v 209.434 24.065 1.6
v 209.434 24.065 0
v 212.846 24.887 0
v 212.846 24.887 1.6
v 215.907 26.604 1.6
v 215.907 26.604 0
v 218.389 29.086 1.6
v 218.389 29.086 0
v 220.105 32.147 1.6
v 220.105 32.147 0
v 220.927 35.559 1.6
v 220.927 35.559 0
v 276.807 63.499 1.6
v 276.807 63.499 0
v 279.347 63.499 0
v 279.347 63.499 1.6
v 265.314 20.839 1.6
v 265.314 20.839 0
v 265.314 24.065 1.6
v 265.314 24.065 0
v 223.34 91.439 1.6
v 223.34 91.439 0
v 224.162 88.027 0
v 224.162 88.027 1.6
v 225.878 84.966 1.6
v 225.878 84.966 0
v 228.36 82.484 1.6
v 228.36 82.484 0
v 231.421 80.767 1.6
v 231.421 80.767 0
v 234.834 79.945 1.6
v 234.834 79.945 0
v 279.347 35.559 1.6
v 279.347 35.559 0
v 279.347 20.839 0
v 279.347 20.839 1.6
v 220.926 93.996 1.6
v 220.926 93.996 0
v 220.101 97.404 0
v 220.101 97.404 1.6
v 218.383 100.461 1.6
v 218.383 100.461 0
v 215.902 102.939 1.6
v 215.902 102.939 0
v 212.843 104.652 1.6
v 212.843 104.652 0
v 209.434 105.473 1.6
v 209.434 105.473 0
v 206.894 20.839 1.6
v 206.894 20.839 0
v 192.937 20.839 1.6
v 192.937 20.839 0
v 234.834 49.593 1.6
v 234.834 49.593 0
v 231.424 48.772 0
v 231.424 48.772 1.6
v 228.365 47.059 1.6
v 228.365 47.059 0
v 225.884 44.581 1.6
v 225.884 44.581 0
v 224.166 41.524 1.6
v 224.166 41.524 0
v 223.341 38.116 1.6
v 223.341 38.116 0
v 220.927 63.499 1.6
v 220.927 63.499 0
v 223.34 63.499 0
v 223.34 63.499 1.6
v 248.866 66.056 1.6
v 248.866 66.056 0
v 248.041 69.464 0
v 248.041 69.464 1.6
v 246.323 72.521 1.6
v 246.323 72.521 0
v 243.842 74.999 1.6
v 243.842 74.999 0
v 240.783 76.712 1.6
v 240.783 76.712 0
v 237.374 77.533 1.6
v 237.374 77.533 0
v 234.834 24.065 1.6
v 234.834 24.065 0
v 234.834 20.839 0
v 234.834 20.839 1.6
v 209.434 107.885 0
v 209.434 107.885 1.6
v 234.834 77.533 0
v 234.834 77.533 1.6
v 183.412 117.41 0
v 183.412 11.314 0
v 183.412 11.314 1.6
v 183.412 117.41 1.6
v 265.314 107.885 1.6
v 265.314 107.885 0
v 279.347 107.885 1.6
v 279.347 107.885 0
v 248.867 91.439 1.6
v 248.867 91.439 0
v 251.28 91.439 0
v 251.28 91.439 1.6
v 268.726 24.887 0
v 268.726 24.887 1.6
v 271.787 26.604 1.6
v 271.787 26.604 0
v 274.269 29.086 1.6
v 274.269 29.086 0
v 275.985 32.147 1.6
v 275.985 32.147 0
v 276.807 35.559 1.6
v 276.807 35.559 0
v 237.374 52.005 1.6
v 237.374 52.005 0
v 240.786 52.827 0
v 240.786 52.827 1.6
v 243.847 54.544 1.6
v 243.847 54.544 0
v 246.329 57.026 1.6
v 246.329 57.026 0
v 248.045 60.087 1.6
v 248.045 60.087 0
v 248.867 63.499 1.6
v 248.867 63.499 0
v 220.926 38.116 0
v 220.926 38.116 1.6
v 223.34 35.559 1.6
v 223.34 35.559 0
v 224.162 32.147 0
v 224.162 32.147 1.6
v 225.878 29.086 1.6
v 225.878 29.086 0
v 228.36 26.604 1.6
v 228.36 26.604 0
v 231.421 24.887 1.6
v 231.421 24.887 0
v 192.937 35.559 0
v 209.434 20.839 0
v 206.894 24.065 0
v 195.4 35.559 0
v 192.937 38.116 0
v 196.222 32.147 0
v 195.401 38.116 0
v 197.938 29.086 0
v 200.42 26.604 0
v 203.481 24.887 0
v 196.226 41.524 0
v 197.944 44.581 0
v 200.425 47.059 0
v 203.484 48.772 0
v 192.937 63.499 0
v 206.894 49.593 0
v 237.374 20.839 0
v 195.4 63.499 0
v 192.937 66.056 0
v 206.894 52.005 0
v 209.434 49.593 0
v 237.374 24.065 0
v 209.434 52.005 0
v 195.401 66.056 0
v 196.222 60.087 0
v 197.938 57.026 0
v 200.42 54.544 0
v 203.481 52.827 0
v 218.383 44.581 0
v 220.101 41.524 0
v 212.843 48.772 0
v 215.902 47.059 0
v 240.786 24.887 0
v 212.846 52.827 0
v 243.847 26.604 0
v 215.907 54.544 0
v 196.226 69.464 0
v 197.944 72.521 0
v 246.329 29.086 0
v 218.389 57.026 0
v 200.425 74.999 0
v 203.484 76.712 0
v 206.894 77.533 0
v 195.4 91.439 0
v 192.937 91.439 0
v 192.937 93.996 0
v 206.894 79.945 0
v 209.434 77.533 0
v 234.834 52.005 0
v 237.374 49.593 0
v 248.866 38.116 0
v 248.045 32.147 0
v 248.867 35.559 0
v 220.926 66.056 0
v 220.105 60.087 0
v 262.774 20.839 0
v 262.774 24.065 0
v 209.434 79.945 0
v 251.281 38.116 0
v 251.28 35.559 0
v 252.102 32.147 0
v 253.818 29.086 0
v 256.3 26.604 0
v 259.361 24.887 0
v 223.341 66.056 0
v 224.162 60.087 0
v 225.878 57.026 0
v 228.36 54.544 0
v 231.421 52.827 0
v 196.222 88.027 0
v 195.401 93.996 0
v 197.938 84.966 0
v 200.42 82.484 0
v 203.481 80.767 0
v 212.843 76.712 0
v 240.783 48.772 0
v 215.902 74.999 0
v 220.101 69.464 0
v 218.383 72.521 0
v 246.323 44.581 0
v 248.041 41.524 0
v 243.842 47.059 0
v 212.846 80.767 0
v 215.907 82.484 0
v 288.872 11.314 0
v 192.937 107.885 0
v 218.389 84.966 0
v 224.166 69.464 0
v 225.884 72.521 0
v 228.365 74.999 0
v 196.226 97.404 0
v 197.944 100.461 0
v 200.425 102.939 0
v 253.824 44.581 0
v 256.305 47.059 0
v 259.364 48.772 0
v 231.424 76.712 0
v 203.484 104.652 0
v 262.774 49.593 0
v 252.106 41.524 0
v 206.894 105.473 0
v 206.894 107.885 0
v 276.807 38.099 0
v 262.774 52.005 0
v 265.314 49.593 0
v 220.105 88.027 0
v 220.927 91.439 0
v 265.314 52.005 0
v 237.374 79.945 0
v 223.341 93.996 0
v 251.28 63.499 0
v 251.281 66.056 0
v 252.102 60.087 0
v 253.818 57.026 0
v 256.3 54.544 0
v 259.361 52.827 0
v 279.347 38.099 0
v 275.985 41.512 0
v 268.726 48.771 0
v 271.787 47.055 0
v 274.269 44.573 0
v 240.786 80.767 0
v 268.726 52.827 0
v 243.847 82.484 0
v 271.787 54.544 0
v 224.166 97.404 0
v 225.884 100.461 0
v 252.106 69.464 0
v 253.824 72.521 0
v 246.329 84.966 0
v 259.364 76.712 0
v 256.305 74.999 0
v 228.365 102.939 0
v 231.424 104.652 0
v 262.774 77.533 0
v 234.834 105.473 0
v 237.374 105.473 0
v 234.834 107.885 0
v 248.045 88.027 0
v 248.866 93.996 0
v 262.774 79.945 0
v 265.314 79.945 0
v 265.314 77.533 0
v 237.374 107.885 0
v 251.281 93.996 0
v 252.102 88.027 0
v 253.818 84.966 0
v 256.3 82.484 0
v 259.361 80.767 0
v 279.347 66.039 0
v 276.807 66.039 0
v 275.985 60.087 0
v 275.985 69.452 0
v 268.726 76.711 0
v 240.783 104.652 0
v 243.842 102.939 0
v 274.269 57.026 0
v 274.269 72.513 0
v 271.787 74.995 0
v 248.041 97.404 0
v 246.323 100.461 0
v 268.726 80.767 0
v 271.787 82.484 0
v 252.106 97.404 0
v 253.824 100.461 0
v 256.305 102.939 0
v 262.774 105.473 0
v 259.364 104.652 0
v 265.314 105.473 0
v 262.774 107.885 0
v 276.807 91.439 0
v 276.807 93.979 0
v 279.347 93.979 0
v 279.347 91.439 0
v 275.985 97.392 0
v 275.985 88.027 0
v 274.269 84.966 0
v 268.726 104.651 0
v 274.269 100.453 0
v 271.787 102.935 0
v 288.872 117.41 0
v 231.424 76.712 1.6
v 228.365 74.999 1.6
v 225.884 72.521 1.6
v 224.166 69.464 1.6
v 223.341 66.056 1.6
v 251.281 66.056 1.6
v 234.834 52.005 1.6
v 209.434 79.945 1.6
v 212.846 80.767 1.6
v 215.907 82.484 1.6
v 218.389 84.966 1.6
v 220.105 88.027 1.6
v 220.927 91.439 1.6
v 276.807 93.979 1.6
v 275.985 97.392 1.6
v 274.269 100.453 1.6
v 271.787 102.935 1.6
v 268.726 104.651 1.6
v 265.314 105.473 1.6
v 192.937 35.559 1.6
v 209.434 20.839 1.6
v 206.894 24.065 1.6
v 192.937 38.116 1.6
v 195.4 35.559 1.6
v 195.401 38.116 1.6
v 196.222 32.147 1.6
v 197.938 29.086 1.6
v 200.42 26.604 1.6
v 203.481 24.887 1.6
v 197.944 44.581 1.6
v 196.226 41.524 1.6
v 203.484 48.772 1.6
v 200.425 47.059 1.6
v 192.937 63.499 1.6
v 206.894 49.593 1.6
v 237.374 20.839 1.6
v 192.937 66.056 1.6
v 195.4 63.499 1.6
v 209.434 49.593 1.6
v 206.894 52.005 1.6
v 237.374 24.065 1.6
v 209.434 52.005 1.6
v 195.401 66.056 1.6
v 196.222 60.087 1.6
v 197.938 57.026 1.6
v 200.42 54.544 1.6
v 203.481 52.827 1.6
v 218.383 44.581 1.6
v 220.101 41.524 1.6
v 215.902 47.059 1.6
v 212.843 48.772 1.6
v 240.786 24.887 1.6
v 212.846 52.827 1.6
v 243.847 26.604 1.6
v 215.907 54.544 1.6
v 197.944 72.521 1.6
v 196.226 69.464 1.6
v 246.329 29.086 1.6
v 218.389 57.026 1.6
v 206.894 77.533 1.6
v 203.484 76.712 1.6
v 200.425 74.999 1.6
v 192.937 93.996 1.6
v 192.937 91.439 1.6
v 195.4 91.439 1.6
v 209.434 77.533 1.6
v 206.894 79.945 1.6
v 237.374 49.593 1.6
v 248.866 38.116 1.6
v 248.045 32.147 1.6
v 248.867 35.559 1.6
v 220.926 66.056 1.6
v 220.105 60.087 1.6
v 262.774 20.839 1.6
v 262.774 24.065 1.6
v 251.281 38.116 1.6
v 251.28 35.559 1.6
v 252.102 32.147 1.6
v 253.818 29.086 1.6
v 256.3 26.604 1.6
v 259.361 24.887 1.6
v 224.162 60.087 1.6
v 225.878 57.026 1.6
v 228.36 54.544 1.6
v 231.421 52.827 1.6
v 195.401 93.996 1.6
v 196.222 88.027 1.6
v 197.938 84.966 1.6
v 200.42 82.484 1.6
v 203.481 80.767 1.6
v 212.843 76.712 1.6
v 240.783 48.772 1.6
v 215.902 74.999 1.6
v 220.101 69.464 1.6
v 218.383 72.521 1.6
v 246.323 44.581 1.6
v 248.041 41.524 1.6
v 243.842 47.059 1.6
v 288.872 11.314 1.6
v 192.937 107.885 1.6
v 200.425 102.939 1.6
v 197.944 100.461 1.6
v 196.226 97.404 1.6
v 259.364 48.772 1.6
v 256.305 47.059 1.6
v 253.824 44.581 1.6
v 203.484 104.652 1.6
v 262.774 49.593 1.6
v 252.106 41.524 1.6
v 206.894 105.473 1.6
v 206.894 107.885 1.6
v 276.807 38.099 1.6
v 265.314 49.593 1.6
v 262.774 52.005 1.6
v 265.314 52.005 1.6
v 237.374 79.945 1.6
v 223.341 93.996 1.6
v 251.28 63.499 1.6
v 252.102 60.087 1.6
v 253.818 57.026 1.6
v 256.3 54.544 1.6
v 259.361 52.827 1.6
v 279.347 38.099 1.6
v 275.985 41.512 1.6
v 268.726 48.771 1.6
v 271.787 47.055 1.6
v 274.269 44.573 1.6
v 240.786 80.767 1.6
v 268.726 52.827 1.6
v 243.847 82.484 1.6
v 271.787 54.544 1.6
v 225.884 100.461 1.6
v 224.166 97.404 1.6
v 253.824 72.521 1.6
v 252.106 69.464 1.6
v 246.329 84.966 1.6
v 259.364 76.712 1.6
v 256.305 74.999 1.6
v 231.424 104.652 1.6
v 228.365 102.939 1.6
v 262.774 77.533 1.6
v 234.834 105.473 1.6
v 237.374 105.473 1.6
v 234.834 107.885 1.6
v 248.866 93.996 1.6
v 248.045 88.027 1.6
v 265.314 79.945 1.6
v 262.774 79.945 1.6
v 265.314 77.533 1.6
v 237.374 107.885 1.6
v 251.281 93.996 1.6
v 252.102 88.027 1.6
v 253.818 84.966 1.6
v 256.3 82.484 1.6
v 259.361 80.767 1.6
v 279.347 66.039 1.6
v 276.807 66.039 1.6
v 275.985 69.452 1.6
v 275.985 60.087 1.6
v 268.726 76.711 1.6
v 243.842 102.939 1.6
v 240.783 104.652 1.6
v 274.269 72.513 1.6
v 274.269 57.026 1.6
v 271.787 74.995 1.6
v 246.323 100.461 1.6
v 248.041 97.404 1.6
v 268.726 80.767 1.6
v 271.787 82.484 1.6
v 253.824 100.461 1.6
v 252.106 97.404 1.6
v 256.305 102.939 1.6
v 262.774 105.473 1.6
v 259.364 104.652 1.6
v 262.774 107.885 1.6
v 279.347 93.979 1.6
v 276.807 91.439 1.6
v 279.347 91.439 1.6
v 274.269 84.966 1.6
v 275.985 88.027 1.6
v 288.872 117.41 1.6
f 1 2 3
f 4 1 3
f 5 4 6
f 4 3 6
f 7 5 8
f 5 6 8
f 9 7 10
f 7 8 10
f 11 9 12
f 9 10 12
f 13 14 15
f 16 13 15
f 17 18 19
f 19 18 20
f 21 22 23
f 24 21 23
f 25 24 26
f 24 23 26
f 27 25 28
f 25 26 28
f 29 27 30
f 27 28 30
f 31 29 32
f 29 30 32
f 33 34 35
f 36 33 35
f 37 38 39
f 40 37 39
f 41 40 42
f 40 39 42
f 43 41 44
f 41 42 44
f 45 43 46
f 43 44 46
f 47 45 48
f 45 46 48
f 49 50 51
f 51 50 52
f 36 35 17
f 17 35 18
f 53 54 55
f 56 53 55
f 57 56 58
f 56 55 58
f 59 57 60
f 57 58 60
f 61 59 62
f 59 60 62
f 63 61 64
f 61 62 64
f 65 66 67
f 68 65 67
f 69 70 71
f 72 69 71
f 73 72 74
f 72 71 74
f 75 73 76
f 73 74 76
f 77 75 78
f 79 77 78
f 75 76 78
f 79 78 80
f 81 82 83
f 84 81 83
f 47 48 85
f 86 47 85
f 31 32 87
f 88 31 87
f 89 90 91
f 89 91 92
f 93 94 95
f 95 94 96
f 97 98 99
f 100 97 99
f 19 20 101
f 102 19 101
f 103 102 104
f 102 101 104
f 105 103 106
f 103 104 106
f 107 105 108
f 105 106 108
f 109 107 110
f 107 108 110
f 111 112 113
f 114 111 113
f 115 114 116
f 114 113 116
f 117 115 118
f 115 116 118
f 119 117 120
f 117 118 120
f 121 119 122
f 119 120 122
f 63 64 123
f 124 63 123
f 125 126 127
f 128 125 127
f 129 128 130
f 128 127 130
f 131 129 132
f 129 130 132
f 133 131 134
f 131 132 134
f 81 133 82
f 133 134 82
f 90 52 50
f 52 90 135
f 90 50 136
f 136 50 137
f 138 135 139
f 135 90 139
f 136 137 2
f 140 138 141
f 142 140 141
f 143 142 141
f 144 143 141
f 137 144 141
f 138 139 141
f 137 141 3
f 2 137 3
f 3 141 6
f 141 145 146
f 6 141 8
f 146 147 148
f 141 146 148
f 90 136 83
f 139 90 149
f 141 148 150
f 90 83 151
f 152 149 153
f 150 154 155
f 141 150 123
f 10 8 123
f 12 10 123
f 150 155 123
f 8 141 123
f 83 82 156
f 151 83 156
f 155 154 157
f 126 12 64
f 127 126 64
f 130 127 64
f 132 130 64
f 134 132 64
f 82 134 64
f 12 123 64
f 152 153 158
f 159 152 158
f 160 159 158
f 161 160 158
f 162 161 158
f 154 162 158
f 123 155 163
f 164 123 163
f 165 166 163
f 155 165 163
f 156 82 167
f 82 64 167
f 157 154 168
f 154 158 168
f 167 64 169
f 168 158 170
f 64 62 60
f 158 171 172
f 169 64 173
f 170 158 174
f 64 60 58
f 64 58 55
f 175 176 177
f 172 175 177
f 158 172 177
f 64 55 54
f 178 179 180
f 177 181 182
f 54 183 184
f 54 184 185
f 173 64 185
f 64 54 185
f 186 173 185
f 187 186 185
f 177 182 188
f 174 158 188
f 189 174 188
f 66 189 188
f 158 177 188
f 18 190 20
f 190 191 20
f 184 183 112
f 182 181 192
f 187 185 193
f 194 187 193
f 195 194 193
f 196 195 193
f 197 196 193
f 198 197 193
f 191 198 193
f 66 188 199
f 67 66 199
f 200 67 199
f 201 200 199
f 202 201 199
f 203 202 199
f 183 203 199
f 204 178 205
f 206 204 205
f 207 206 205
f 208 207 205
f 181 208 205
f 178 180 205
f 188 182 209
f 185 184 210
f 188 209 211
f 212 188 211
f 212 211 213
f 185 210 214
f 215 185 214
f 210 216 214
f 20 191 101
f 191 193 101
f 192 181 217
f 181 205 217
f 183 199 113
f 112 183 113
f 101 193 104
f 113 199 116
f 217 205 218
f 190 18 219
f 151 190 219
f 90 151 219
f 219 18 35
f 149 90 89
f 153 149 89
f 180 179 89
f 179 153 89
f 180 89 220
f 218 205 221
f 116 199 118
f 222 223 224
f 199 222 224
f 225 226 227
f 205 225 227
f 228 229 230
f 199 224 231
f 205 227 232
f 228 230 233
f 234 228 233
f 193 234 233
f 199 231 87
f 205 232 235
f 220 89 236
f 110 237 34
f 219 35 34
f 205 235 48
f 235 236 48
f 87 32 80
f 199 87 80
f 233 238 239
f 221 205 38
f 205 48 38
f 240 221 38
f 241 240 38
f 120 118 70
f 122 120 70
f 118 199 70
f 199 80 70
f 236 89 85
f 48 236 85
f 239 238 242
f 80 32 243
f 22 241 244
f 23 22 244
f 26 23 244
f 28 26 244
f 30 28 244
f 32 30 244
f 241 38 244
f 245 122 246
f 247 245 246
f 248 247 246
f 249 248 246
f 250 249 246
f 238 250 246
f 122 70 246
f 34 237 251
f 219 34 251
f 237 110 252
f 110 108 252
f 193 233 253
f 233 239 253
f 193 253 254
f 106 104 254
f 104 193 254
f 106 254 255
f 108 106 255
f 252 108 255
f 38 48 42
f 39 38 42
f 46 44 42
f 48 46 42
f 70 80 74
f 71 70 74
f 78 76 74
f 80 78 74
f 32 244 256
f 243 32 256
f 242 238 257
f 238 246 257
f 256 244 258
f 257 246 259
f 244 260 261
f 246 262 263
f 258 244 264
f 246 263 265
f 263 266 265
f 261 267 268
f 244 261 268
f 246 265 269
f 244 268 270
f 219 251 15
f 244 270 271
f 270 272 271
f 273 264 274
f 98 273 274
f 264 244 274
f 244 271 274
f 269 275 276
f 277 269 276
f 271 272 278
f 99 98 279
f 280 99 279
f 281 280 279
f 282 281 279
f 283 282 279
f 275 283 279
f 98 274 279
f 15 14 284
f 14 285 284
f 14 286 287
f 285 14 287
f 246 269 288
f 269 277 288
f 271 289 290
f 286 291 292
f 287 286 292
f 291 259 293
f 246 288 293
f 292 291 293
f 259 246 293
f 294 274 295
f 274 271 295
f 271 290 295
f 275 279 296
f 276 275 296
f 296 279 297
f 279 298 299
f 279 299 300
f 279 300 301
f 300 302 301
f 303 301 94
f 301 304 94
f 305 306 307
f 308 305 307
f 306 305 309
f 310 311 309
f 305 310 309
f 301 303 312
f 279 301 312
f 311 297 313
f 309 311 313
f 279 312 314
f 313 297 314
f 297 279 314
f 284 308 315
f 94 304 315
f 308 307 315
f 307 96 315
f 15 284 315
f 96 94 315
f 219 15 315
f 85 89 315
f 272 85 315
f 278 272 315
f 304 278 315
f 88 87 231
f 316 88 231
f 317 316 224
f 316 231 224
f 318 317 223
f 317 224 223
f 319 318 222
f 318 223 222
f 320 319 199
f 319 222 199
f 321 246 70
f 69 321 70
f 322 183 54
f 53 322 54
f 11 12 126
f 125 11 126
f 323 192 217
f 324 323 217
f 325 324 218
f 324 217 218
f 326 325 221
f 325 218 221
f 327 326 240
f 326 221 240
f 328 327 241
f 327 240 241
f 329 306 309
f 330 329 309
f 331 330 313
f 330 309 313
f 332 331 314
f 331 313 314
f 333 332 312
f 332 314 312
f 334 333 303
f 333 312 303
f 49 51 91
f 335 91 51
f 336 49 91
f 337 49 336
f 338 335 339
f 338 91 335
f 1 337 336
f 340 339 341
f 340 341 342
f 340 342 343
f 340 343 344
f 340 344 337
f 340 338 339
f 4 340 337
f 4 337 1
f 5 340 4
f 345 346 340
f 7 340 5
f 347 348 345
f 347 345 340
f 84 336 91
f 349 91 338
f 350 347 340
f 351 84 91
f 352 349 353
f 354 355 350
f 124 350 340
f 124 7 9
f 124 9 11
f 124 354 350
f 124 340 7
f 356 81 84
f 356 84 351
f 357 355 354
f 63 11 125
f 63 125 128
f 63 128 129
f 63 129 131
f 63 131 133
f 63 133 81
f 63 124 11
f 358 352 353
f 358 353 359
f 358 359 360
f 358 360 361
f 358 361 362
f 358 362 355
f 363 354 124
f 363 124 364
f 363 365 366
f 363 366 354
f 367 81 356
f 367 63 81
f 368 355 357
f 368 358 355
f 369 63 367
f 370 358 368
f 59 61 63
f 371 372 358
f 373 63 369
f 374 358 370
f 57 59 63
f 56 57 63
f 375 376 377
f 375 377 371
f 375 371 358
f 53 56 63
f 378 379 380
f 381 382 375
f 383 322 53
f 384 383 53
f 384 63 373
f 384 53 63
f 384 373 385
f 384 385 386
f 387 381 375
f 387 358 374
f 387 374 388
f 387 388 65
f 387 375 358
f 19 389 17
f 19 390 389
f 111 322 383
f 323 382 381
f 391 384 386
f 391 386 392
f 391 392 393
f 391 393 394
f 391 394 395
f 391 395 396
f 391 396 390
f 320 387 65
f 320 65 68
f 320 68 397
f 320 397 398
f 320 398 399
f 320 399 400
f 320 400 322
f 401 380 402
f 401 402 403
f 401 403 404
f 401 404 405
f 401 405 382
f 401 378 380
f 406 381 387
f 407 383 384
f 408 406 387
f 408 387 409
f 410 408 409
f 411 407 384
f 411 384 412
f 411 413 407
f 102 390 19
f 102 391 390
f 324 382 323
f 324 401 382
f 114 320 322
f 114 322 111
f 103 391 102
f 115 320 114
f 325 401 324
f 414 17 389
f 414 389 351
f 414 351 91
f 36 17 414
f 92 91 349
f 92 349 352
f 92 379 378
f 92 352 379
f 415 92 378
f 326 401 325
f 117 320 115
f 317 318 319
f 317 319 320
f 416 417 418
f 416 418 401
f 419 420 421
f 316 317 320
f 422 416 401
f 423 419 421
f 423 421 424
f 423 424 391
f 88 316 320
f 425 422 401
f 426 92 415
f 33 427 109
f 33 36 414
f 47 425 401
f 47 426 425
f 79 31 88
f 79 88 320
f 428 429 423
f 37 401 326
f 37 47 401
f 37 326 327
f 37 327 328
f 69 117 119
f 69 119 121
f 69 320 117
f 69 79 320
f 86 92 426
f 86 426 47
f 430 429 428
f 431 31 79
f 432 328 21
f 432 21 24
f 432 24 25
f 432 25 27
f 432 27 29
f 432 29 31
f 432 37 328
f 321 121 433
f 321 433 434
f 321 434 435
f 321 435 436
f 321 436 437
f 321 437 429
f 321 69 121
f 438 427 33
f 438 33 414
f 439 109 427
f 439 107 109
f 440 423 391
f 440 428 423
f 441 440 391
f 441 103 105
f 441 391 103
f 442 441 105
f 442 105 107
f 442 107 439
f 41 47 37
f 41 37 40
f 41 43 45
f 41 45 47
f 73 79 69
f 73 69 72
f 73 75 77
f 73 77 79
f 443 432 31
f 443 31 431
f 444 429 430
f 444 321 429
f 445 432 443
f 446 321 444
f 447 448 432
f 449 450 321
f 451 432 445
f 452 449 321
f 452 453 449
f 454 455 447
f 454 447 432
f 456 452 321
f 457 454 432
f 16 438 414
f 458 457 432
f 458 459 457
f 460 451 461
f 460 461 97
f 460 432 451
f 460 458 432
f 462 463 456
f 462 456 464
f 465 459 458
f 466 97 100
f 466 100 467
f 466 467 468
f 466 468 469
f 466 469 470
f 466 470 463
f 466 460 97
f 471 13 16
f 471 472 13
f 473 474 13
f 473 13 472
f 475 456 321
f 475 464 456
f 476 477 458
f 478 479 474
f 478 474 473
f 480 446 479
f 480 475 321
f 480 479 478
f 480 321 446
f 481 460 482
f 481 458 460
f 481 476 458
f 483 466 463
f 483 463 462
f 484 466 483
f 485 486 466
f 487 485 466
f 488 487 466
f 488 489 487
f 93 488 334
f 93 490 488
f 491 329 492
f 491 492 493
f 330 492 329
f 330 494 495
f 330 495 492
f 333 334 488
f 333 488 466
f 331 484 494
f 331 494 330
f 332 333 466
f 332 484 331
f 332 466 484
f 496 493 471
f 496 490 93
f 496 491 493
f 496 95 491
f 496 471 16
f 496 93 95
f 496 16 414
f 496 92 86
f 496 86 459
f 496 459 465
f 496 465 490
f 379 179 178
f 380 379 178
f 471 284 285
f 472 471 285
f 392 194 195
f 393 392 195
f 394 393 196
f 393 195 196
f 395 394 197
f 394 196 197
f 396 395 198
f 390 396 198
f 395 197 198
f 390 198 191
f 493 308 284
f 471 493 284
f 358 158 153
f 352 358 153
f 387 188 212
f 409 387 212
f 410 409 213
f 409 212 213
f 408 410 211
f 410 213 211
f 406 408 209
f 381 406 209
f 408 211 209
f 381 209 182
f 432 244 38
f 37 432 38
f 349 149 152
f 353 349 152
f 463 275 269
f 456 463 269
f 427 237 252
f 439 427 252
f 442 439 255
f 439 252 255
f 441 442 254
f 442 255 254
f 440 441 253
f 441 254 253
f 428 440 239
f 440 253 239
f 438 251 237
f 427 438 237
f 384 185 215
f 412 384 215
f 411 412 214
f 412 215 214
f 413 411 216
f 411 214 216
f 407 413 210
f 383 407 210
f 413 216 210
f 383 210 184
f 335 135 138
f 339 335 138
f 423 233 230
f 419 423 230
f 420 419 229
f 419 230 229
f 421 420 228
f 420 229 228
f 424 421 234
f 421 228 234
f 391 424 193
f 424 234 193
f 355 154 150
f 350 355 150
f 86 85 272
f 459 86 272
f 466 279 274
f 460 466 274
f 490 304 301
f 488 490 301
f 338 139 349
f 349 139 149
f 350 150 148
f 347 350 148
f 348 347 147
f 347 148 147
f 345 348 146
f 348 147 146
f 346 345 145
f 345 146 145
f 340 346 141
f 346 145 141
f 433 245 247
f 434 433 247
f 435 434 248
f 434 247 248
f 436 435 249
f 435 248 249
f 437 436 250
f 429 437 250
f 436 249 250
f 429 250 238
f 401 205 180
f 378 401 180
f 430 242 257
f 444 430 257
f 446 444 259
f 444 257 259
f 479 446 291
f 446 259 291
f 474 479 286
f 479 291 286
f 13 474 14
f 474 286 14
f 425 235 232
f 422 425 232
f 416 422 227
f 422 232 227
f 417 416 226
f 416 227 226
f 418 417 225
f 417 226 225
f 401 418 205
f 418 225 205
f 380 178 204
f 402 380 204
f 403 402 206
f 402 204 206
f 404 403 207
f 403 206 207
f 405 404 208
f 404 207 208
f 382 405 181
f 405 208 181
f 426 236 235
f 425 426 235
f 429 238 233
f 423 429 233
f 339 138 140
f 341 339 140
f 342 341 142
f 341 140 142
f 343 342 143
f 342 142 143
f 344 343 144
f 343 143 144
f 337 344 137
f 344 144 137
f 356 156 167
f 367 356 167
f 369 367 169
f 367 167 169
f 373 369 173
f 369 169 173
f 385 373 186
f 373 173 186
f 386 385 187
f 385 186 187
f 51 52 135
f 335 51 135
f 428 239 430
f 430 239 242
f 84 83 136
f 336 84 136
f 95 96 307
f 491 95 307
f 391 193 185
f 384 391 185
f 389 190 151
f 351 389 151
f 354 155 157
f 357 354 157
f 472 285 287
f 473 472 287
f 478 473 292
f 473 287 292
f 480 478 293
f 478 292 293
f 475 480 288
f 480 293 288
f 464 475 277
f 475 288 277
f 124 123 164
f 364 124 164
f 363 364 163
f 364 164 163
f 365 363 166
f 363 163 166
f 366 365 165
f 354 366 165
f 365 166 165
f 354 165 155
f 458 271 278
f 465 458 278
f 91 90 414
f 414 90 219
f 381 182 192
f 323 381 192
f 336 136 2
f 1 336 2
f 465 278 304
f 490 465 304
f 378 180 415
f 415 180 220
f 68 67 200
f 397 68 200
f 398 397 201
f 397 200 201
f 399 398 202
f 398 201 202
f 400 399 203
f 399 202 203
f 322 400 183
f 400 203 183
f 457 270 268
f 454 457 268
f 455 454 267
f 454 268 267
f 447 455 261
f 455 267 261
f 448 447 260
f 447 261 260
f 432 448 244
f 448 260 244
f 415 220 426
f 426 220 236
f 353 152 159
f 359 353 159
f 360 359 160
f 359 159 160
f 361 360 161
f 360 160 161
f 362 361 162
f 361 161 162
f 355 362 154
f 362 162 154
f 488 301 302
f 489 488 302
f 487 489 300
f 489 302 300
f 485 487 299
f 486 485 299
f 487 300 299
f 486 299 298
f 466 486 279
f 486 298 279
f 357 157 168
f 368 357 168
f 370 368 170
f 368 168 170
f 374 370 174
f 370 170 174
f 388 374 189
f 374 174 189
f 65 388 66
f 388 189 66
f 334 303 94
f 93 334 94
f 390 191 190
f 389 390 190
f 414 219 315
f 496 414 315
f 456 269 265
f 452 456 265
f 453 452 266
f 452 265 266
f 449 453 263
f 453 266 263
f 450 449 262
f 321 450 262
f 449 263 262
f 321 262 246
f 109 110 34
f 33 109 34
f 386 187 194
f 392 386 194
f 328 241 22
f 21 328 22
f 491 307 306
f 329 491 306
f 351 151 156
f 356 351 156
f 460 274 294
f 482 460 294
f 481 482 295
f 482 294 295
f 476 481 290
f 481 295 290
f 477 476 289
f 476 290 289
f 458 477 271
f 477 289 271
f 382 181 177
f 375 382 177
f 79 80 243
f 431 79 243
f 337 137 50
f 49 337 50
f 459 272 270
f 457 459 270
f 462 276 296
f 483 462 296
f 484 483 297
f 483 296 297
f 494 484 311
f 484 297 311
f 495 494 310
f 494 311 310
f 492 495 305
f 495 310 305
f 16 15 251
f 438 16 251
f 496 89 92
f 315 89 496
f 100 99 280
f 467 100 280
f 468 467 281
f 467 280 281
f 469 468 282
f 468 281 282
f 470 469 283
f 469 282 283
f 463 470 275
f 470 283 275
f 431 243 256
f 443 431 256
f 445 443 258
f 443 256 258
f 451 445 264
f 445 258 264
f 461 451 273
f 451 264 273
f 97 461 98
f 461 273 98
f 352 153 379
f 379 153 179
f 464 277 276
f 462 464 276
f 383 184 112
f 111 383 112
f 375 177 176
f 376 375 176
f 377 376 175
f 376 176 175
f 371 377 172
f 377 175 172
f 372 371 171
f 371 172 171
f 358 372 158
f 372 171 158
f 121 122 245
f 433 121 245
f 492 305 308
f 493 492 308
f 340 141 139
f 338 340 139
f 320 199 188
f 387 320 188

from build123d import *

# Parameters (mm, degrees)
F0_W     = 105.460206
F0_H     = 106.09659
F1_DEPTH = 1.6


with BuildPart() as f1:
    # F0 (on Top) → F1 (new body)
    with BuildSketch(Plane.XY):
        with Locations((236.142386, 64.362091)):
            Rectangle(F0_W, F0_H)
        with BuildLine():
            Line((192.937283, 35.55936), (195.399541, 35.55936))
            ThreePointArc((195.399541, 35.55936), (199.093456, 27.759301), (206.893515, 24.065386))
            Line((206.893515, 24.065386), (206.893515, 20.838796))
            Line((206.893515, 20.838796), (192.937283, 20.838796))
            Line((192.937283, 20.838796), (192.937283, 35.55936))
        make_face(mode=Mode.SUBTRACT)
        with BuildLine():
            Line((234.833515, 20.838796), (209.433515, 20.838796))
            Line((209.433515, 20.838796), (209.433515, 24.065386))
            ThreePointArc((209.433515, 24.065386), (217.233573, 27.759301), (220.927489, 35.55936))
            Line((220.927489, 35.55936), (223.339541, 35.55936))
            ThreePointArc((223.339541, 35.55936), (227.033456, 27.759301), (234.833515, 24.065386))
            Line((234.833515, 24.065386), (234.833515, 20.838796))
        make_face(mode=Mode.SUBTRACT)
        with BuildLine():
            Line((206.893515, 52.005386), (206.893515, 49.593334))
            ThreePointArc((206.893515, 49.593334), (199.099195, 45.905154), (195.401158, 38.115505))
            Line((195.401158, 38.115505), (192.937283, 38.115505))
            Line((192.937283, 38.115505), (192.937283, 63.49936))
            Line((192.937283, 63.49936), (195.399541, 63.49936))
            ThreePointArc((195.399541, 63.49936), (199.093456, 55.699301), (206.893515, 52.005386))
        make_face(mode=Mode.SUBTRACT)
        with BuildLine():
            Line((223.341158, 38.115505), (220.925872, 38.115505))
            ThreePointArc((220.925872, 38.115505), (217.227835, 45.905154), (209.433515, 49.593334))
            Line((209.433515, 49.593334), (209.433515, 52.005386))
            ThreePointArc((209.433515, 52.005386), (217.233573, 55.699301), (220.927489, 63.49936))
            Line((220.927489, 63.49936), (223.339541, 63.49936))
            ThreePointArc((223.339541, 63.49936), (227.033456, 55.699301), (234.833515, 52.005386))
            Line((234.833515, 52.005386), (234.833515, 49.593334))
            ThreePointArc((234.833515, 49.593334), (227.039195, 45.905154), (223.341158, 38.115505))
        make_face(mode=Mode.SUBTRACT)
        with BuildLine():
            Line((237.373515, 20.838796), (237.373515, 24.065386))
            ThreePointArc((237.373515, 24.065386), (245.173573, 27.759301), (248.867489, 35.55936))
            Line((248.867489, 35.55936), (251.279541, 35.55936))
            ThreePointArc((251.279541, 35.55936), (254.973456, 27.759301), (262.773515, 24.065386))
            Line((262.773515, 24.065386), (262.773515, 20.838796))
            Line((262.773515, 20.838796), (237.373515, 20.838796))
        make_face(mode=Mode.SUBTRACT)
        with BuildLine():
            Line((265.313515, 20.838796), (265.313515, 24.065386))
            ThreePointArc((265.313515, 24.065386), (273.113573, 27.759301), (276.807489, 35.55936))
            Line((276.807489, 35.55936), (279.347489, 35.55936))
            Line((279.347489, 35.55936), (279.347489, 20.838796))
            Line((279.347489, 20.838796), (265.313515, 20.838796))
        make_face(mode=Mode.SUBTRACT)
        with BuildLine():
            Line((251.281158, 38.115505), (248.865872, 38.115505))
            ThreePointArc((248.865872, 38.115505), (245.167835, 45.905154), (237.373515, 49.593334))
            Line((237.373515, 49.593334), (237.373515, 52.005386))
            ThreePointArc((237.373515, 52.005386), (245.173573, 55.699301), (248.867489, 63.49936))
            Line((248.867489, 63.49936), (251.279541, 63.49936))
            ThreePointArc((251.279541, 63.49936), (254.973456, 55.699301), (262.773515, 52.005386))
            Line((262.773515, 52.005386), (262.773515, 49.593334))
            ThreePointArc((262.773515, 49.593334), (254.979195, 45.905154), (251.281158, 38.115505))
        make_face(mode=Mode.SUBTRACT)
        with BuildLine():
            Line((279.347489, 38.09936), (276.807489, 38.09936))
            ThreePointArc((276.807489, 38.09936), (273.113573, 45.899419), (265.313515, 49.593334))
            Line((265.313515, 49.593334), (265.313515, 52.005386))
            ThreePointArc((265.313515, 52.005386), (273.113573, 55.699301), (276.807489, 63.49936))
            Line((276.807489, 63.49936), (279.347489, 63.49936))
            Line((279.347489, 63.49936), (279.347489, 38.09936))
        make_face(mode=Mode.SUBTRACT)
        with BuildLine():
            Line((206.893515, 79.945386), (206.893515, 77.533334))
            ThreePointArc((206.893515, 77.533334), (199.099195, 73.845154), (195.401158, 66.055505))
            Line((195.401158, 66.055505), (192.937283, 66.055505))
            Line((192.937283, 66.055505), (192.937283, 91.43936))
            Line((192.937283, 91.43936), (195.399541, 91.43936))
            ThreePointArc((195.399541, 91.43936), (199.093456, 83.639301), (206.893515, 79.945386))
        make_face(mode=Mode.SUBTRACT)
        with BuildLine():
            Line((223.341158, 66.055505), (220.925872, 66.055505))
            ThreePointArc((220.925872, 66.055505), (217.227835, 73.845154), (209.433515, 77.533334))
            Line((209.433515, 77.533334), (209.433515, 79.945386))
            ThreePointArc((209.433515, 79.945386), (217.233573, 83.639301), (220.927489, 91.43936))
            Line((220.927489, 91.43936), (223.339541, 91.43936))
            ThreePointArc((223.339541, 91.43936), (227.033456, 83.639301), (234.833515, 79.945386))
            Line((234.833515, 79.945386), (234.833515, 77.533334))
            ThreePointArc((234.833515, 77.533334), (227.039195, 73.845154), (223.341158, 66.055505))
        make_face(mode=Mode.SUBTRACT)
        with BuildLine():
            Line((206.893515, 107.885386), (206.893515, 105.473334))
            ThreePointArc((206.893515, 105.473334), (199.099195, 101.785154), (195.401158, 93.995505))
            Line((195.401158, 93.995505), (192.937283, 93.995505))
            Line((192.937283, 93.995505), (192.937283, 107.885386))
            Line((192.937283, 107.885386), (206.893515, 107.885386))
        make_face(mode=Mode.SUBTRACT)
        with BuildLine():
            Line((223.341158, 93.995505), (220.925872, 93.995505))
            ThreePointArc((220.925872, 93.995505), (217.227835, 101.785154), (209.433515, 105.473334))
            Line((209.433515, 105.473334), (209.433515, 107.885386))
            Line((209.433515, 107.885386), (234.833515, 107.885386))
            Line((234.833515, 107.885386), (234.833515, 105.473334))
            ThreePointArc((234.833515, 105.473334), (227.039195, 101.785154), (223.341158, 93.995505))
        make_face(mode=Mode.SUBTRACT)
        with BuildLine():
            Line((251.281158, 66.055505), (248.865872, 66.055505))
            ThreePointArc((248.865872, 66.055505), (245.167835, 73.845154), (237.373515, 77.533334))
            Line((237.373515, 77.533334), (237.373515, 79.945386))
            ThreePointArc((237.373515, 79.945386), (245.173573, 83.639301), (248.867489, 91.43936))
            Line((248.867489, 91.43936), (251.279541, 91.43936))
            ThreePointArc((251.279541, 91.43936), (254.973456, 83.639301), (262.773515, 79.945386))
            Line((262.773515, 79.945386), (262.773515, 77.533334))
            ThreePointArc((262.773515, 77.533334), (254.979195, 73.845154), (251.281158, 66.055505))
        make_face(mode=Mode.SUBTRACT)
        with BuildLine():
            Line((279.347489, 66.03936), (276.807489, 66.03936))
            ThreePointArc((276.807489, 66.03936), (273.113573, 73.839419), (265.313515, 77.533334))
            Line((265.313515, 77.533334), (265.313515, 79.945386))
            ThreePointArc((265.313515, 79.945386), (273.113573, 83.639301), (276.807489, 91.43936))
            Line((276.807489, 91.43936), (279.347489, 91.43936))
            Line((279.347489, 91.43936), (279.347489, 66.03936))
        make_face(mode=Mode.SUBTRACT)
        with BuildLine():
            Line((251.281158, 93.995505), (248.865872, 93.995505))
            ThreePointArc((248.865872, 93.995505), (245.167835, 101.785154), (237.373515, 105.473334))
            Line((237.373515, 105.473334), (237.373515, 107.885386))
            Line((237.373515, 107.885386), (262.773515, 107.885386))
            Line((262.773515, 107.885386), (262.773515, 105.473334))
            ThreePointArc((262.773515, 105.473334), (254.979195, 101.785154), (251.281158, 93.995505))
        make_face(mode=Mode.SUBTRACT)
        with BuildLine():
            Line((279.347489, 93.97936), (276.807489, 93.97936))
            ThreePointArc((276.807489, 93.97936), (273.113573, 101.779419), (265.313515, 105.473334))
            Line((265.313515, 105.473334), (265.313515, 107.885386))
            Line((265.313515, 107.885386), (279.347489, 107.885386))
            Line((279.347489, 107.885386), (279.347489, 93.97936))
        make_face(mode=Mode.SUBTRACT)
    extrude(amount=F1_DEPTH)


solid = f1.part
